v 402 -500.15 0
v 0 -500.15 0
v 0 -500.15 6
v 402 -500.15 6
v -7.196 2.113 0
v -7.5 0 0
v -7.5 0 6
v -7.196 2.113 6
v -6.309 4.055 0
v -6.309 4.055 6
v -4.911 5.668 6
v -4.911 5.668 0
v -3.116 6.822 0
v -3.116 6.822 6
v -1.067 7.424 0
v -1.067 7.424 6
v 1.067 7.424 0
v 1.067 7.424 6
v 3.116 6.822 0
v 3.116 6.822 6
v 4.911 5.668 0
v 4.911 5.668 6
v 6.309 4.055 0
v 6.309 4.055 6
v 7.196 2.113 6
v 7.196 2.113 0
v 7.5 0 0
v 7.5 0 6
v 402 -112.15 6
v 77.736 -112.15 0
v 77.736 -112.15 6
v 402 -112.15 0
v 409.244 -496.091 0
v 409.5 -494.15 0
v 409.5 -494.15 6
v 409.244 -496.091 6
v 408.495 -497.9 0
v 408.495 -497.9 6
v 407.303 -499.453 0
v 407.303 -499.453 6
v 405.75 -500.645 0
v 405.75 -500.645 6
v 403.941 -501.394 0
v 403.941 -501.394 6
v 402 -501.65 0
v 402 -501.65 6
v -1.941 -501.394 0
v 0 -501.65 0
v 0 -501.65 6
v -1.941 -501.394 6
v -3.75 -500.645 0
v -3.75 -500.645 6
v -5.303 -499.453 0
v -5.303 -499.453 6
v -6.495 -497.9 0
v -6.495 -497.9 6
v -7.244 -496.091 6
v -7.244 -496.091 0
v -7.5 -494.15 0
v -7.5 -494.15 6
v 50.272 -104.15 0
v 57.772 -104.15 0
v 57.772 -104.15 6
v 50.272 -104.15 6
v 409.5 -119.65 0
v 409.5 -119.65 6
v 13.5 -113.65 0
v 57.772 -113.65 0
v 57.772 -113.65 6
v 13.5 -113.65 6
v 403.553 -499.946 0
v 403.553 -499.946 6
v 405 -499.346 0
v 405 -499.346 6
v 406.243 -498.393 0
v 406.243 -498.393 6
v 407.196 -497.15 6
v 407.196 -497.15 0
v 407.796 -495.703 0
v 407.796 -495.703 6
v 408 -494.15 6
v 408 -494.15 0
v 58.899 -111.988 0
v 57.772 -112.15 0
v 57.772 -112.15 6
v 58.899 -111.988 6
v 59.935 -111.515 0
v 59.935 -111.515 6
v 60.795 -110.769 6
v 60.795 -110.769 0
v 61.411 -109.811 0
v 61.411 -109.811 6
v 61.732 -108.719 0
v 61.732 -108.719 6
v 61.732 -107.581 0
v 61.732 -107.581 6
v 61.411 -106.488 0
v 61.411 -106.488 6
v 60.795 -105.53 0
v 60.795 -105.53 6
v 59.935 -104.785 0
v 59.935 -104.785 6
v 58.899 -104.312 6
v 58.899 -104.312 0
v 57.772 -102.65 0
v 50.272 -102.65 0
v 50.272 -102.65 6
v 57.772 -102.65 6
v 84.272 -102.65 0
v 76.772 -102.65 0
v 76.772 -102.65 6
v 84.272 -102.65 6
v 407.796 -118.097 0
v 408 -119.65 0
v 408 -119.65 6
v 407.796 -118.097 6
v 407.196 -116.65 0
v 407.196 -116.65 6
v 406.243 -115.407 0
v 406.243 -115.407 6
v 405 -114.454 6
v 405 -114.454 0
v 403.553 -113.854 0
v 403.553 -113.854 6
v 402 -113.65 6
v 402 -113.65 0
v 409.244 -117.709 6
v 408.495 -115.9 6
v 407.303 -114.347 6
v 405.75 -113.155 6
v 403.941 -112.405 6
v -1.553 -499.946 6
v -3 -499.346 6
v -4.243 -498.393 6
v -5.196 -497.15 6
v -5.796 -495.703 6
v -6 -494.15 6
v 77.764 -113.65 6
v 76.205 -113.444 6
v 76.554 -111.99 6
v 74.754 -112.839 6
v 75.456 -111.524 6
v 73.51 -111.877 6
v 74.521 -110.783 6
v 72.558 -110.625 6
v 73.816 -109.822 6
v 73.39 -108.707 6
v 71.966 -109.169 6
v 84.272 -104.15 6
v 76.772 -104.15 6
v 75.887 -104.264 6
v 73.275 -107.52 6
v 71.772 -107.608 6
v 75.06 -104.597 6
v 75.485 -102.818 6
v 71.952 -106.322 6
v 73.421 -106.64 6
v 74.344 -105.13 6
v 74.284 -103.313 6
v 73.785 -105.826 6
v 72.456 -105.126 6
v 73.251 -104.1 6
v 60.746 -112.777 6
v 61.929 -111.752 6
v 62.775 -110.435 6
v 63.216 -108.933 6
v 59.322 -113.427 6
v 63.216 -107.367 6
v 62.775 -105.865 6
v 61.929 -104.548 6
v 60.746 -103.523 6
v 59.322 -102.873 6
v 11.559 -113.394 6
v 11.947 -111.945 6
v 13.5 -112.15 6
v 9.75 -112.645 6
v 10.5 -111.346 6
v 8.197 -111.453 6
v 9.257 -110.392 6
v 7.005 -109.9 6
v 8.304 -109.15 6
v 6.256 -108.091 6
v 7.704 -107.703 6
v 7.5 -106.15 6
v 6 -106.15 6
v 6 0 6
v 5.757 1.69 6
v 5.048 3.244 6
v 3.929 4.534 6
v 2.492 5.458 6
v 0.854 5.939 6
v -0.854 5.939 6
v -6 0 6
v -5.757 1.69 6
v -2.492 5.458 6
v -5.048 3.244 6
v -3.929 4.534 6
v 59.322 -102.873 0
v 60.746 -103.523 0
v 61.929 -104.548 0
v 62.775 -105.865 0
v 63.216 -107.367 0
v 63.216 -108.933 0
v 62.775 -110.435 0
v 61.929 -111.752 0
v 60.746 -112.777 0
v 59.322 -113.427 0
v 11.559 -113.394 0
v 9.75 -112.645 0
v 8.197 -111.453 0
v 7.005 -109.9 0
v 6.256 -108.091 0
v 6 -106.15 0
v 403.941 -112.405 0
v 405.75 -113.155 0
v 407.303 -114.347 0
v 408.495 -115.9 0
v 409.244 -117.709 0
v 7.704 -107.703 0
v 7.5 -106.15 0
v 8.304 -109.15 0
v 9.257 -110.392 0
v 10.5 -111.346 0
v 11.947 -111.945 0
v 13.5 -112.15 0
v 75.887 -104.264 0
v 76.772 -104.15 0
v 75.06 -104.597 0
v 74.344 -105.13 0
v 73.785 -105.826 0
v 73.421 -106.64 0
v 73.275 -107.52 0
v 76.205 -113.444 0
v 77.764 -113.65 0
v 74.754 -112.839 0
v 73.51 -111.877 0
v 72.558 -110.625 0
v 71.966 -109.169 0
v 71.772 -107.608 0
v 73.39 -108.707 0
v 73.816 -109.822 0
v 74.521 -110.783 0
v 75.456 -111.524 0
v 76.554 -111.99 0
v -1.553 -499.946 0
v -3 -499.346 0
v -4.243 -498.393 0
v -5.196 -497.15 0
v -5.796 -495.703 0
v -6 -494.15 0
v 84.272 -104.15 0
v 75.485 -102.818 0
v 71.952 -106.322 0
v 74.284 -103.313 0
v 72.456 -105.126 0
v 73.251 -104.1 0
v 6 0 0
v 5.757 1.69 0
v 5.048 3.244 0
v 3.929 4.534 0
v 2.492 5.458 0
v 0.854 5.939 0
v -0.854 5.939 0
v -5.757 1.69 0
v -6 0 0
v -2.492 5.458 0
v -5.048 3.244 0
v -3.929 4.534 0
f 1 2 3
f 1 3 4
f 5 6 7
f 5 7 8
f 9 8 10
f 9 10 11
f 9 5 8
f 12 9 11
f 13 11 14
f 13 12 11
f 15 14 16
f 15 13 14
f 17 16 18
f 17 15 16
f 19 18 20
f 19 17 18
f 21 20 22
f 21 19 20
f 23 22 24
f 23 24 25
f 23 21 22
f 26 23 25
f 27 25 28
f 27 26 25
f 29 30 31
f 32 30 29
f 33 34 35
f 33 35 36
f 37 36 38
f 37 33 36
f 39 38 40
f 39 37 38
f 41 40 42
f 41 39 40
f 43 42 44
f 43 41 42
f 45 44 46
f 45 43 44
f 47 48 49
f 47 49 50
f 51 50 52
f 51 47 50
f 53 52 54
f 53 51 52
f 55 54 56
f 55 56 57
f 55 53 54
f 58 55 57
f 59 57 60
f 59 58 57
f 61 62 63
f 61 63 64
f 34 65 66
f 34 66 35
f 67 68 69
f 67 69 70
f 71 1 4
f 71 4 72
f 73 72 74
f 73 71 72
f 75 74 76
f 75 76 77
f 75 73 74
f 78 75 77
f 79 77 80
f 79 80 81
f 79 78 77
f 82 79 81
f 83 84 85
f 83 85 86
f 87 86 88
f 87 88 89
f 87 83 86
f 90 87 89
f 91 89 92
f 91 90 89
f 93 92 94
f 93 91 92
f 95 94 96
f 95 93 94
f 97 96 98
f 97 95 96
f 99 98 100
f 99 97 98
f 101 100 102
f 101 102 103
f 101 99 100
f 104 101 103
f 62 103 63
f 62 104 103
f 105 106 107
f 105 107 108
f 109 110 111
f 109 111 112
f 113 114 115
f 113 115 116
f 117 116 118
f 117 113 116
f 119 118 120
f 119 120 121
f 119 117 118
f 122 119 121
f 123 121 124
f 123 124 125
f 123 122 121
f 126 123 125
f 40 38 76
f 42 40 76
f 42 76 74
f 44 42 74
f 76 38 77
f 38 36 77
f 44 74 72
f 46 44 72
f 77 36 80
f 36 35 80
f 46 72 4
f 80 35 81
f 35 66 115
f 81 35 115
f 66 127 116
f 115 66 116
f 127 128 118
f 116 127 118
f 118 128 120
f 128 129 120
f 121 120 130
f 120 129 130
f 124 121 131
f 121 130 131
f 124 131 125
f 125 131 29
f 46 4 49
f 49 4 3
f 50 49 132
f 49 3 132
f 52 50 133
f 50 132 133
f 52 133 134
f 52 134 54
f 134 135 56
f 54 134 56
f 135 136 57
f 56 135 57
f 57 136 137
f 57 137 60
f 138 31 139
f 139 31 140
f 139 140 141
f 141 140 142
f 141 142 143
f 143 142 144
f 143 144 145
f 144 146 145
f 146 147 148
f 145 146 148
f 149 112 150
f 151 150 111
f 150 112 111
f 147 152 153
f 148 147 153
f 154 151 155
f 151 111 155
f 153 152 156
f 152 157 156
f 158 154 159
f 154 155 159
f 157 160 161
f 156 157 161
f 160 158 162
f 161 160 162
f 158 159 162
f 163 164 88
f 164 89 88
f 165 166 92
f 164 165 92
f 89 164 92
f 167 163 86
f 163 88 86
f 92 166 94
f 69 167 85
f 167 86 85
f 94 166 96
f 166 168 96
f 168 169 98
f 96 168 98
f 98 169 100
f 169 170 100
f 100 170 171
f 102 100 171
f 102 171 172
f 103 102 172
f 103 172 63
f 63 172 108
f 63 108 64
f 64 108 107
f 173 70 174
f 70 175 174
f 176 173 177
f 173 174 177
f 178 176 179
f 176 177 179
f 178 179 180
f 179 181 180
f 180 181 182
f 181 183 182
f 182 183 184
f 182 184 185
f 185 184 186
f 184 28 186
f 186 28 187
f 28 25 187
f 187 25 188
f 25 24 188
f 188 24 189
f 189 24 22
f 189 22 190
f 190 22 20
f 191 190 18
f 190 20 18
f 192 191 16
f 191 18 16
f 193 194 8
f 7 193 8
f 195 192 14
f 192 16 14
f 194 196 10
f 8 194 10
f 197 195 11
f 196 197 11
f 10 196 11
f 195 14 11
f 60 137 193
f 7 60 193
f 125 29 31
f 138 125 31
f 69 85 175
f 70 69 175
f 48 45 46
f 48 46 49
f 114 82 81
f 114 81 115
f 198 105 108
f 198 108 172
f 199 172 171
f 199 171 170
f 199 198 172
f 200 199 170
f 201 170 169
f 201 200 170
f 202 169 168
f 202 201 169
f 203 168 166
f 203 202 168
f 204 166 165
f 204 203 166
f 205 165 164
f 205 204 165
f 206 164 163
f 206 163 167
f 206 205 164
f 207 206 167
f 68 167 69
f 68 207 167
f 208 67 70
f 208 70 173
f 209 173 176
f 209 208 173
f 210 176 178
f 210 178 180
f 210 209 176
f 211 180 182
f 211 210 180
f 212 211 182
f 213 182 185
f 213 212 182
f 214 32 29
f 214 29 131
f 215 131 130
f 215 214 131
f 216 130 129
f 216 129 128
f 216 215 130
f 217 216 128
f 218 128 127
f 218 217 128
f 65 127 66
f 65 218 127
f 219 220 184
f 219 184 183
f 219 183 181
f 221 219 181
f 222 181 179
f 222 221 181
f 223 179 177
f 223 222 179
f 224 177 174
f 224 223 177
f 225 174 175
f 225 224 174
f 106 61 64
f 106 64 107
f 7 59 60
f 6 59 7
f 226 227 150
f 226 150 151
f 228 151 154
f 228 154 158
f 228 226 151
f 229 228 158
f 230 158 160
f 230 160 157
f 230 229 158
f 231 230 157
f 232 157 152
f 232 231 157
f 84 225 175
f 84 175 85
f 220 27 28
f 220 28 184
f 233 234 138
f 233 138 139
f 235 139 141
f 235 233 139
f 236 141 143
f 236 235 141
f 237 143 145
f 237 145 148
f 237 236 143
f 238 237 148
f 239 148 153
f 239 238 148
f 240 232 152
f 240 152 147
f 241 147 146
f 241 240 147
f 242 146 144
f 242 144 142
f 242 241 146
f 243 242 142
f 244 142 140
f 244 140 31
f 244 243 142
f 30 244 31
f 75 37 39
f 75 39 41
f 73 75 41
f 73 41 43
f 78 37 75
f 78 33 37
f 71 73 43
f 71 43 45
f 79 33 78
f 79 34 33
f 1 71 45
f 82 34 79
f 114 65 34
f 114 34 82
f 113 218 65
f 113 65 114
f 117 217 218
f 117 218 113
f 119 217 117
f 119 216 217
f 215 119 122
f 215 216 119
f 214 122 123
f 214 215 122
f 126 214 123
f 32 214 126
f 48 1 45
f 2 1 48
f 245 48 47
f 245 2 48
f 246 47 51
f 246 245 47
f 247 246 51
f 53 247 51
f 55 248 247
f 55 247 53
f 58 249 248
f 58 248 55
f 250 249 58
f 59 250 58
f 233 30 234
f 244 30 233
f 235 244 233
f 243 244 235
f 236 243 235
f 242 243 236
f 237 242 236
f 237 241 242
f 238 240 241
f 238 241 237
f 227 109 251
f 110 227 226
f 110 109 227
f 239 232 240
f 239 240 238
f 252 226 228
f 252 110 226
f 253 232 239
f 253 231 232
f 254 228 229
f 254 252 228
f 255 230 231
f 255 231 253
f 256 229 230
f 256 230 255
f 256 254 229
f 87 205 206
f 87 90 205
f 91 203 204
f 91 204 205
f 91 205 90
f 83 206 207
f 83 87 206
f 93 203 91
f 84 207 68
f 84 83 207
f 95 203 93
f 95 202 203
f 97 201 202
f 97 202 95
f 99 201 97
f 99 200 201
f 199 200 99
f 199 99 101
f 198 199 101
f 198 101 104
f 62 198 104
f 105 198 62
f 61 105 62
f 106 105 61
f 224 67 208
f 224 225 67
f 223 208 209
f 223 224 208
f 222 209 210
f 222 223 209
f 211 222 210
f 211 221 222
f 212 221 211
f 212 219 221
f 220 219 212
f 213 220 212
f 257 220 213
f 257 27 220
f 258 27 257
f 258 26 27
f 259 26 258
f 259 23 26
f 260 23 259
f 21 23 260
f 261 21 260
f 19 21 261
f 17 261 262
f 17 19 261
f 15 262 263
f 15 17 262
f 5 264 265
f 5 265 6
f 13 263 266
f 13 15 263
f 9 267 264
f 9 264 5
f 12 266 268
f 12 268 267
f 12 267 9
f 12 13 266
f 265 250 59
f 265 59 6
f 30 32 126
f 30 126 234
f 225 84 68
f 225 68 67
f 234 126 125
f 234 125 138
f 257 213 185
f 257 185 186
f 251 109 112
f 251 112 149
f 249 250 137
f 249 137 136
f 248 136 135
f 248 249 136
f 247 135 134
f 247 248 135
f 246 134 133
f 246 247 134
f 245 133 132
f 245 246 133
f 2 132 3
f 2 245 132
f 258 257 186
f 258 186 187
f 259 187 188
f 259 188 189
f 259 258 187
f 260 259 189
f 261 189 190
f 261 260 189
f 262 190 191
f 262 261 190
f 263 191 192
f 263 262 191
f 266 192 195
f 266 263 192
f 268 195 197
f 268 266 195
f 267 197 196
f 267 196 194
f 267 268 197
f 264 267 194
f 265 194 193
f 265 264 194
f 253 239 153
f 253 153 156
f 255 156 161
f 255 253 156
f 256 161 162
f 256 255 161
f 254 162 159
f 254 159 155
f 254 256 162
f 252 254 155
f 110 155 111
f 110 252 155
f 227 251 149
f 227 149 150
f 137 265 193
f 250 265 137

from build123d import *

# Parameters (mm, degrees)
BOSS_EXTRUDE1_DEPTH = 6


with BuildPart() as part:
    # Sketch1 → Boss-Extrude1 (new body)
    with BuildSketch(Plane.XY):
        with BuildLine():
            Line((-6, 0), (-6, -494.15))
            ThreePointArc((-6, -494.15), (-4.242640687, -498.392640687), (0, -500.15))
            Line((0, -500.15), (402, -500.15))
            ThreePointArc((402, -500.15), (406.242640687, -498.392640687), (408, -494.15))
            Line((408, -494.15), (408, -119.649819196))
            ThreePointArc((408, -119.649819196), (406.242640687, -115.407178509), (402, -113.649819196))
            Line((402, -113.649819196), (77.763956729, -113.649819196))
            ThreePointArc((77.763956729, -113.649819196), (73.509598553, -111.877262252), (71.772388716, -107.60834862))
            ThreePointArc((71.772388716, -107.60834862), (73.251375418, -104.099653504), (76.772216732, -102.649819196))
            Line((76.772216732, -102.649819196), (84.272216732, -102.649819196))
            Line((84.272216732, -102.649819196), (84.272216732, -104.149819196))
            Line((84.272216732, -104.149819196), (76.772216732, -104.149819196))
            ThreePointArc((76.772216732, -104.149819196), (74.343547137, -105.129588254), (73.274612012, -107.520354054))
            ThreePointArc((73.274612012, -107.520354054), (74.521274443, -110.783312955), (77.735886194, -112.149819196))
            Line((77.735886194, -112.149819196), (402, -112.149819196))
            ThreePointArc((402, -112.149819196), (407.303300859, -114.346518337), (409.5, -119.649819196))
            Line((409.5, -119.649819196), (409.5, -494.15))
            ThreePointArc((409.5, -494.15), (407.303300859, -499.453300859), (402, -501.65))
            Line((402, -501.65), (0, -501.65))
            ThreePointArc((0, -501.65), (-5.303300859, -499.453300859), (-7.5, -494.15))
            Line((-7.5, -494.15), (-7.5, 0))
            ThreePointArc((-7.5, 0), (0, 7.5), (7.5, 0))
            Line((7.5, 0), (7.5, -106.149819196))
            ThreePointArc((7.5, -106.149819196), (9.257359313, -110.392459883), (13.5, -112.149819196))
            Line((13.5, -112.149819196), (57.772216732, -112.149819196))
            ThreePointArc((57.772216732, -112.149819196), (61.772216732, -108.149819196), (57.772216732, -104.149819196))
            Line((57.772216732, -104.149819196), (50.272216732, -104.149819196))
            Line((50.272216732, -104.149819196), (50.272216732, -102.649819196))
            Line((50.272216732, -102.649819196), (57.772216732, -102.649819196))
            ThreePointArc((57.772216732, -102.649819196), (63.272216732, -108.149819196), (57.772216732, -113.649819196))
            Line((57.772216732, -113.649819196), (13.5, -113.649819196))
            ThreePointArc((13.5, -113.649819196), (8.196699141, -111.453120055), (6, -106.149819196))
            Line((6, -106.149819196), (6, 0))
            ThreePointArc((6, 0), (0, 6), (-6, 0))
        make_face()
    extrude(amount=BOSS_EXTRUDE1_DEPTH)


solid = part.part
